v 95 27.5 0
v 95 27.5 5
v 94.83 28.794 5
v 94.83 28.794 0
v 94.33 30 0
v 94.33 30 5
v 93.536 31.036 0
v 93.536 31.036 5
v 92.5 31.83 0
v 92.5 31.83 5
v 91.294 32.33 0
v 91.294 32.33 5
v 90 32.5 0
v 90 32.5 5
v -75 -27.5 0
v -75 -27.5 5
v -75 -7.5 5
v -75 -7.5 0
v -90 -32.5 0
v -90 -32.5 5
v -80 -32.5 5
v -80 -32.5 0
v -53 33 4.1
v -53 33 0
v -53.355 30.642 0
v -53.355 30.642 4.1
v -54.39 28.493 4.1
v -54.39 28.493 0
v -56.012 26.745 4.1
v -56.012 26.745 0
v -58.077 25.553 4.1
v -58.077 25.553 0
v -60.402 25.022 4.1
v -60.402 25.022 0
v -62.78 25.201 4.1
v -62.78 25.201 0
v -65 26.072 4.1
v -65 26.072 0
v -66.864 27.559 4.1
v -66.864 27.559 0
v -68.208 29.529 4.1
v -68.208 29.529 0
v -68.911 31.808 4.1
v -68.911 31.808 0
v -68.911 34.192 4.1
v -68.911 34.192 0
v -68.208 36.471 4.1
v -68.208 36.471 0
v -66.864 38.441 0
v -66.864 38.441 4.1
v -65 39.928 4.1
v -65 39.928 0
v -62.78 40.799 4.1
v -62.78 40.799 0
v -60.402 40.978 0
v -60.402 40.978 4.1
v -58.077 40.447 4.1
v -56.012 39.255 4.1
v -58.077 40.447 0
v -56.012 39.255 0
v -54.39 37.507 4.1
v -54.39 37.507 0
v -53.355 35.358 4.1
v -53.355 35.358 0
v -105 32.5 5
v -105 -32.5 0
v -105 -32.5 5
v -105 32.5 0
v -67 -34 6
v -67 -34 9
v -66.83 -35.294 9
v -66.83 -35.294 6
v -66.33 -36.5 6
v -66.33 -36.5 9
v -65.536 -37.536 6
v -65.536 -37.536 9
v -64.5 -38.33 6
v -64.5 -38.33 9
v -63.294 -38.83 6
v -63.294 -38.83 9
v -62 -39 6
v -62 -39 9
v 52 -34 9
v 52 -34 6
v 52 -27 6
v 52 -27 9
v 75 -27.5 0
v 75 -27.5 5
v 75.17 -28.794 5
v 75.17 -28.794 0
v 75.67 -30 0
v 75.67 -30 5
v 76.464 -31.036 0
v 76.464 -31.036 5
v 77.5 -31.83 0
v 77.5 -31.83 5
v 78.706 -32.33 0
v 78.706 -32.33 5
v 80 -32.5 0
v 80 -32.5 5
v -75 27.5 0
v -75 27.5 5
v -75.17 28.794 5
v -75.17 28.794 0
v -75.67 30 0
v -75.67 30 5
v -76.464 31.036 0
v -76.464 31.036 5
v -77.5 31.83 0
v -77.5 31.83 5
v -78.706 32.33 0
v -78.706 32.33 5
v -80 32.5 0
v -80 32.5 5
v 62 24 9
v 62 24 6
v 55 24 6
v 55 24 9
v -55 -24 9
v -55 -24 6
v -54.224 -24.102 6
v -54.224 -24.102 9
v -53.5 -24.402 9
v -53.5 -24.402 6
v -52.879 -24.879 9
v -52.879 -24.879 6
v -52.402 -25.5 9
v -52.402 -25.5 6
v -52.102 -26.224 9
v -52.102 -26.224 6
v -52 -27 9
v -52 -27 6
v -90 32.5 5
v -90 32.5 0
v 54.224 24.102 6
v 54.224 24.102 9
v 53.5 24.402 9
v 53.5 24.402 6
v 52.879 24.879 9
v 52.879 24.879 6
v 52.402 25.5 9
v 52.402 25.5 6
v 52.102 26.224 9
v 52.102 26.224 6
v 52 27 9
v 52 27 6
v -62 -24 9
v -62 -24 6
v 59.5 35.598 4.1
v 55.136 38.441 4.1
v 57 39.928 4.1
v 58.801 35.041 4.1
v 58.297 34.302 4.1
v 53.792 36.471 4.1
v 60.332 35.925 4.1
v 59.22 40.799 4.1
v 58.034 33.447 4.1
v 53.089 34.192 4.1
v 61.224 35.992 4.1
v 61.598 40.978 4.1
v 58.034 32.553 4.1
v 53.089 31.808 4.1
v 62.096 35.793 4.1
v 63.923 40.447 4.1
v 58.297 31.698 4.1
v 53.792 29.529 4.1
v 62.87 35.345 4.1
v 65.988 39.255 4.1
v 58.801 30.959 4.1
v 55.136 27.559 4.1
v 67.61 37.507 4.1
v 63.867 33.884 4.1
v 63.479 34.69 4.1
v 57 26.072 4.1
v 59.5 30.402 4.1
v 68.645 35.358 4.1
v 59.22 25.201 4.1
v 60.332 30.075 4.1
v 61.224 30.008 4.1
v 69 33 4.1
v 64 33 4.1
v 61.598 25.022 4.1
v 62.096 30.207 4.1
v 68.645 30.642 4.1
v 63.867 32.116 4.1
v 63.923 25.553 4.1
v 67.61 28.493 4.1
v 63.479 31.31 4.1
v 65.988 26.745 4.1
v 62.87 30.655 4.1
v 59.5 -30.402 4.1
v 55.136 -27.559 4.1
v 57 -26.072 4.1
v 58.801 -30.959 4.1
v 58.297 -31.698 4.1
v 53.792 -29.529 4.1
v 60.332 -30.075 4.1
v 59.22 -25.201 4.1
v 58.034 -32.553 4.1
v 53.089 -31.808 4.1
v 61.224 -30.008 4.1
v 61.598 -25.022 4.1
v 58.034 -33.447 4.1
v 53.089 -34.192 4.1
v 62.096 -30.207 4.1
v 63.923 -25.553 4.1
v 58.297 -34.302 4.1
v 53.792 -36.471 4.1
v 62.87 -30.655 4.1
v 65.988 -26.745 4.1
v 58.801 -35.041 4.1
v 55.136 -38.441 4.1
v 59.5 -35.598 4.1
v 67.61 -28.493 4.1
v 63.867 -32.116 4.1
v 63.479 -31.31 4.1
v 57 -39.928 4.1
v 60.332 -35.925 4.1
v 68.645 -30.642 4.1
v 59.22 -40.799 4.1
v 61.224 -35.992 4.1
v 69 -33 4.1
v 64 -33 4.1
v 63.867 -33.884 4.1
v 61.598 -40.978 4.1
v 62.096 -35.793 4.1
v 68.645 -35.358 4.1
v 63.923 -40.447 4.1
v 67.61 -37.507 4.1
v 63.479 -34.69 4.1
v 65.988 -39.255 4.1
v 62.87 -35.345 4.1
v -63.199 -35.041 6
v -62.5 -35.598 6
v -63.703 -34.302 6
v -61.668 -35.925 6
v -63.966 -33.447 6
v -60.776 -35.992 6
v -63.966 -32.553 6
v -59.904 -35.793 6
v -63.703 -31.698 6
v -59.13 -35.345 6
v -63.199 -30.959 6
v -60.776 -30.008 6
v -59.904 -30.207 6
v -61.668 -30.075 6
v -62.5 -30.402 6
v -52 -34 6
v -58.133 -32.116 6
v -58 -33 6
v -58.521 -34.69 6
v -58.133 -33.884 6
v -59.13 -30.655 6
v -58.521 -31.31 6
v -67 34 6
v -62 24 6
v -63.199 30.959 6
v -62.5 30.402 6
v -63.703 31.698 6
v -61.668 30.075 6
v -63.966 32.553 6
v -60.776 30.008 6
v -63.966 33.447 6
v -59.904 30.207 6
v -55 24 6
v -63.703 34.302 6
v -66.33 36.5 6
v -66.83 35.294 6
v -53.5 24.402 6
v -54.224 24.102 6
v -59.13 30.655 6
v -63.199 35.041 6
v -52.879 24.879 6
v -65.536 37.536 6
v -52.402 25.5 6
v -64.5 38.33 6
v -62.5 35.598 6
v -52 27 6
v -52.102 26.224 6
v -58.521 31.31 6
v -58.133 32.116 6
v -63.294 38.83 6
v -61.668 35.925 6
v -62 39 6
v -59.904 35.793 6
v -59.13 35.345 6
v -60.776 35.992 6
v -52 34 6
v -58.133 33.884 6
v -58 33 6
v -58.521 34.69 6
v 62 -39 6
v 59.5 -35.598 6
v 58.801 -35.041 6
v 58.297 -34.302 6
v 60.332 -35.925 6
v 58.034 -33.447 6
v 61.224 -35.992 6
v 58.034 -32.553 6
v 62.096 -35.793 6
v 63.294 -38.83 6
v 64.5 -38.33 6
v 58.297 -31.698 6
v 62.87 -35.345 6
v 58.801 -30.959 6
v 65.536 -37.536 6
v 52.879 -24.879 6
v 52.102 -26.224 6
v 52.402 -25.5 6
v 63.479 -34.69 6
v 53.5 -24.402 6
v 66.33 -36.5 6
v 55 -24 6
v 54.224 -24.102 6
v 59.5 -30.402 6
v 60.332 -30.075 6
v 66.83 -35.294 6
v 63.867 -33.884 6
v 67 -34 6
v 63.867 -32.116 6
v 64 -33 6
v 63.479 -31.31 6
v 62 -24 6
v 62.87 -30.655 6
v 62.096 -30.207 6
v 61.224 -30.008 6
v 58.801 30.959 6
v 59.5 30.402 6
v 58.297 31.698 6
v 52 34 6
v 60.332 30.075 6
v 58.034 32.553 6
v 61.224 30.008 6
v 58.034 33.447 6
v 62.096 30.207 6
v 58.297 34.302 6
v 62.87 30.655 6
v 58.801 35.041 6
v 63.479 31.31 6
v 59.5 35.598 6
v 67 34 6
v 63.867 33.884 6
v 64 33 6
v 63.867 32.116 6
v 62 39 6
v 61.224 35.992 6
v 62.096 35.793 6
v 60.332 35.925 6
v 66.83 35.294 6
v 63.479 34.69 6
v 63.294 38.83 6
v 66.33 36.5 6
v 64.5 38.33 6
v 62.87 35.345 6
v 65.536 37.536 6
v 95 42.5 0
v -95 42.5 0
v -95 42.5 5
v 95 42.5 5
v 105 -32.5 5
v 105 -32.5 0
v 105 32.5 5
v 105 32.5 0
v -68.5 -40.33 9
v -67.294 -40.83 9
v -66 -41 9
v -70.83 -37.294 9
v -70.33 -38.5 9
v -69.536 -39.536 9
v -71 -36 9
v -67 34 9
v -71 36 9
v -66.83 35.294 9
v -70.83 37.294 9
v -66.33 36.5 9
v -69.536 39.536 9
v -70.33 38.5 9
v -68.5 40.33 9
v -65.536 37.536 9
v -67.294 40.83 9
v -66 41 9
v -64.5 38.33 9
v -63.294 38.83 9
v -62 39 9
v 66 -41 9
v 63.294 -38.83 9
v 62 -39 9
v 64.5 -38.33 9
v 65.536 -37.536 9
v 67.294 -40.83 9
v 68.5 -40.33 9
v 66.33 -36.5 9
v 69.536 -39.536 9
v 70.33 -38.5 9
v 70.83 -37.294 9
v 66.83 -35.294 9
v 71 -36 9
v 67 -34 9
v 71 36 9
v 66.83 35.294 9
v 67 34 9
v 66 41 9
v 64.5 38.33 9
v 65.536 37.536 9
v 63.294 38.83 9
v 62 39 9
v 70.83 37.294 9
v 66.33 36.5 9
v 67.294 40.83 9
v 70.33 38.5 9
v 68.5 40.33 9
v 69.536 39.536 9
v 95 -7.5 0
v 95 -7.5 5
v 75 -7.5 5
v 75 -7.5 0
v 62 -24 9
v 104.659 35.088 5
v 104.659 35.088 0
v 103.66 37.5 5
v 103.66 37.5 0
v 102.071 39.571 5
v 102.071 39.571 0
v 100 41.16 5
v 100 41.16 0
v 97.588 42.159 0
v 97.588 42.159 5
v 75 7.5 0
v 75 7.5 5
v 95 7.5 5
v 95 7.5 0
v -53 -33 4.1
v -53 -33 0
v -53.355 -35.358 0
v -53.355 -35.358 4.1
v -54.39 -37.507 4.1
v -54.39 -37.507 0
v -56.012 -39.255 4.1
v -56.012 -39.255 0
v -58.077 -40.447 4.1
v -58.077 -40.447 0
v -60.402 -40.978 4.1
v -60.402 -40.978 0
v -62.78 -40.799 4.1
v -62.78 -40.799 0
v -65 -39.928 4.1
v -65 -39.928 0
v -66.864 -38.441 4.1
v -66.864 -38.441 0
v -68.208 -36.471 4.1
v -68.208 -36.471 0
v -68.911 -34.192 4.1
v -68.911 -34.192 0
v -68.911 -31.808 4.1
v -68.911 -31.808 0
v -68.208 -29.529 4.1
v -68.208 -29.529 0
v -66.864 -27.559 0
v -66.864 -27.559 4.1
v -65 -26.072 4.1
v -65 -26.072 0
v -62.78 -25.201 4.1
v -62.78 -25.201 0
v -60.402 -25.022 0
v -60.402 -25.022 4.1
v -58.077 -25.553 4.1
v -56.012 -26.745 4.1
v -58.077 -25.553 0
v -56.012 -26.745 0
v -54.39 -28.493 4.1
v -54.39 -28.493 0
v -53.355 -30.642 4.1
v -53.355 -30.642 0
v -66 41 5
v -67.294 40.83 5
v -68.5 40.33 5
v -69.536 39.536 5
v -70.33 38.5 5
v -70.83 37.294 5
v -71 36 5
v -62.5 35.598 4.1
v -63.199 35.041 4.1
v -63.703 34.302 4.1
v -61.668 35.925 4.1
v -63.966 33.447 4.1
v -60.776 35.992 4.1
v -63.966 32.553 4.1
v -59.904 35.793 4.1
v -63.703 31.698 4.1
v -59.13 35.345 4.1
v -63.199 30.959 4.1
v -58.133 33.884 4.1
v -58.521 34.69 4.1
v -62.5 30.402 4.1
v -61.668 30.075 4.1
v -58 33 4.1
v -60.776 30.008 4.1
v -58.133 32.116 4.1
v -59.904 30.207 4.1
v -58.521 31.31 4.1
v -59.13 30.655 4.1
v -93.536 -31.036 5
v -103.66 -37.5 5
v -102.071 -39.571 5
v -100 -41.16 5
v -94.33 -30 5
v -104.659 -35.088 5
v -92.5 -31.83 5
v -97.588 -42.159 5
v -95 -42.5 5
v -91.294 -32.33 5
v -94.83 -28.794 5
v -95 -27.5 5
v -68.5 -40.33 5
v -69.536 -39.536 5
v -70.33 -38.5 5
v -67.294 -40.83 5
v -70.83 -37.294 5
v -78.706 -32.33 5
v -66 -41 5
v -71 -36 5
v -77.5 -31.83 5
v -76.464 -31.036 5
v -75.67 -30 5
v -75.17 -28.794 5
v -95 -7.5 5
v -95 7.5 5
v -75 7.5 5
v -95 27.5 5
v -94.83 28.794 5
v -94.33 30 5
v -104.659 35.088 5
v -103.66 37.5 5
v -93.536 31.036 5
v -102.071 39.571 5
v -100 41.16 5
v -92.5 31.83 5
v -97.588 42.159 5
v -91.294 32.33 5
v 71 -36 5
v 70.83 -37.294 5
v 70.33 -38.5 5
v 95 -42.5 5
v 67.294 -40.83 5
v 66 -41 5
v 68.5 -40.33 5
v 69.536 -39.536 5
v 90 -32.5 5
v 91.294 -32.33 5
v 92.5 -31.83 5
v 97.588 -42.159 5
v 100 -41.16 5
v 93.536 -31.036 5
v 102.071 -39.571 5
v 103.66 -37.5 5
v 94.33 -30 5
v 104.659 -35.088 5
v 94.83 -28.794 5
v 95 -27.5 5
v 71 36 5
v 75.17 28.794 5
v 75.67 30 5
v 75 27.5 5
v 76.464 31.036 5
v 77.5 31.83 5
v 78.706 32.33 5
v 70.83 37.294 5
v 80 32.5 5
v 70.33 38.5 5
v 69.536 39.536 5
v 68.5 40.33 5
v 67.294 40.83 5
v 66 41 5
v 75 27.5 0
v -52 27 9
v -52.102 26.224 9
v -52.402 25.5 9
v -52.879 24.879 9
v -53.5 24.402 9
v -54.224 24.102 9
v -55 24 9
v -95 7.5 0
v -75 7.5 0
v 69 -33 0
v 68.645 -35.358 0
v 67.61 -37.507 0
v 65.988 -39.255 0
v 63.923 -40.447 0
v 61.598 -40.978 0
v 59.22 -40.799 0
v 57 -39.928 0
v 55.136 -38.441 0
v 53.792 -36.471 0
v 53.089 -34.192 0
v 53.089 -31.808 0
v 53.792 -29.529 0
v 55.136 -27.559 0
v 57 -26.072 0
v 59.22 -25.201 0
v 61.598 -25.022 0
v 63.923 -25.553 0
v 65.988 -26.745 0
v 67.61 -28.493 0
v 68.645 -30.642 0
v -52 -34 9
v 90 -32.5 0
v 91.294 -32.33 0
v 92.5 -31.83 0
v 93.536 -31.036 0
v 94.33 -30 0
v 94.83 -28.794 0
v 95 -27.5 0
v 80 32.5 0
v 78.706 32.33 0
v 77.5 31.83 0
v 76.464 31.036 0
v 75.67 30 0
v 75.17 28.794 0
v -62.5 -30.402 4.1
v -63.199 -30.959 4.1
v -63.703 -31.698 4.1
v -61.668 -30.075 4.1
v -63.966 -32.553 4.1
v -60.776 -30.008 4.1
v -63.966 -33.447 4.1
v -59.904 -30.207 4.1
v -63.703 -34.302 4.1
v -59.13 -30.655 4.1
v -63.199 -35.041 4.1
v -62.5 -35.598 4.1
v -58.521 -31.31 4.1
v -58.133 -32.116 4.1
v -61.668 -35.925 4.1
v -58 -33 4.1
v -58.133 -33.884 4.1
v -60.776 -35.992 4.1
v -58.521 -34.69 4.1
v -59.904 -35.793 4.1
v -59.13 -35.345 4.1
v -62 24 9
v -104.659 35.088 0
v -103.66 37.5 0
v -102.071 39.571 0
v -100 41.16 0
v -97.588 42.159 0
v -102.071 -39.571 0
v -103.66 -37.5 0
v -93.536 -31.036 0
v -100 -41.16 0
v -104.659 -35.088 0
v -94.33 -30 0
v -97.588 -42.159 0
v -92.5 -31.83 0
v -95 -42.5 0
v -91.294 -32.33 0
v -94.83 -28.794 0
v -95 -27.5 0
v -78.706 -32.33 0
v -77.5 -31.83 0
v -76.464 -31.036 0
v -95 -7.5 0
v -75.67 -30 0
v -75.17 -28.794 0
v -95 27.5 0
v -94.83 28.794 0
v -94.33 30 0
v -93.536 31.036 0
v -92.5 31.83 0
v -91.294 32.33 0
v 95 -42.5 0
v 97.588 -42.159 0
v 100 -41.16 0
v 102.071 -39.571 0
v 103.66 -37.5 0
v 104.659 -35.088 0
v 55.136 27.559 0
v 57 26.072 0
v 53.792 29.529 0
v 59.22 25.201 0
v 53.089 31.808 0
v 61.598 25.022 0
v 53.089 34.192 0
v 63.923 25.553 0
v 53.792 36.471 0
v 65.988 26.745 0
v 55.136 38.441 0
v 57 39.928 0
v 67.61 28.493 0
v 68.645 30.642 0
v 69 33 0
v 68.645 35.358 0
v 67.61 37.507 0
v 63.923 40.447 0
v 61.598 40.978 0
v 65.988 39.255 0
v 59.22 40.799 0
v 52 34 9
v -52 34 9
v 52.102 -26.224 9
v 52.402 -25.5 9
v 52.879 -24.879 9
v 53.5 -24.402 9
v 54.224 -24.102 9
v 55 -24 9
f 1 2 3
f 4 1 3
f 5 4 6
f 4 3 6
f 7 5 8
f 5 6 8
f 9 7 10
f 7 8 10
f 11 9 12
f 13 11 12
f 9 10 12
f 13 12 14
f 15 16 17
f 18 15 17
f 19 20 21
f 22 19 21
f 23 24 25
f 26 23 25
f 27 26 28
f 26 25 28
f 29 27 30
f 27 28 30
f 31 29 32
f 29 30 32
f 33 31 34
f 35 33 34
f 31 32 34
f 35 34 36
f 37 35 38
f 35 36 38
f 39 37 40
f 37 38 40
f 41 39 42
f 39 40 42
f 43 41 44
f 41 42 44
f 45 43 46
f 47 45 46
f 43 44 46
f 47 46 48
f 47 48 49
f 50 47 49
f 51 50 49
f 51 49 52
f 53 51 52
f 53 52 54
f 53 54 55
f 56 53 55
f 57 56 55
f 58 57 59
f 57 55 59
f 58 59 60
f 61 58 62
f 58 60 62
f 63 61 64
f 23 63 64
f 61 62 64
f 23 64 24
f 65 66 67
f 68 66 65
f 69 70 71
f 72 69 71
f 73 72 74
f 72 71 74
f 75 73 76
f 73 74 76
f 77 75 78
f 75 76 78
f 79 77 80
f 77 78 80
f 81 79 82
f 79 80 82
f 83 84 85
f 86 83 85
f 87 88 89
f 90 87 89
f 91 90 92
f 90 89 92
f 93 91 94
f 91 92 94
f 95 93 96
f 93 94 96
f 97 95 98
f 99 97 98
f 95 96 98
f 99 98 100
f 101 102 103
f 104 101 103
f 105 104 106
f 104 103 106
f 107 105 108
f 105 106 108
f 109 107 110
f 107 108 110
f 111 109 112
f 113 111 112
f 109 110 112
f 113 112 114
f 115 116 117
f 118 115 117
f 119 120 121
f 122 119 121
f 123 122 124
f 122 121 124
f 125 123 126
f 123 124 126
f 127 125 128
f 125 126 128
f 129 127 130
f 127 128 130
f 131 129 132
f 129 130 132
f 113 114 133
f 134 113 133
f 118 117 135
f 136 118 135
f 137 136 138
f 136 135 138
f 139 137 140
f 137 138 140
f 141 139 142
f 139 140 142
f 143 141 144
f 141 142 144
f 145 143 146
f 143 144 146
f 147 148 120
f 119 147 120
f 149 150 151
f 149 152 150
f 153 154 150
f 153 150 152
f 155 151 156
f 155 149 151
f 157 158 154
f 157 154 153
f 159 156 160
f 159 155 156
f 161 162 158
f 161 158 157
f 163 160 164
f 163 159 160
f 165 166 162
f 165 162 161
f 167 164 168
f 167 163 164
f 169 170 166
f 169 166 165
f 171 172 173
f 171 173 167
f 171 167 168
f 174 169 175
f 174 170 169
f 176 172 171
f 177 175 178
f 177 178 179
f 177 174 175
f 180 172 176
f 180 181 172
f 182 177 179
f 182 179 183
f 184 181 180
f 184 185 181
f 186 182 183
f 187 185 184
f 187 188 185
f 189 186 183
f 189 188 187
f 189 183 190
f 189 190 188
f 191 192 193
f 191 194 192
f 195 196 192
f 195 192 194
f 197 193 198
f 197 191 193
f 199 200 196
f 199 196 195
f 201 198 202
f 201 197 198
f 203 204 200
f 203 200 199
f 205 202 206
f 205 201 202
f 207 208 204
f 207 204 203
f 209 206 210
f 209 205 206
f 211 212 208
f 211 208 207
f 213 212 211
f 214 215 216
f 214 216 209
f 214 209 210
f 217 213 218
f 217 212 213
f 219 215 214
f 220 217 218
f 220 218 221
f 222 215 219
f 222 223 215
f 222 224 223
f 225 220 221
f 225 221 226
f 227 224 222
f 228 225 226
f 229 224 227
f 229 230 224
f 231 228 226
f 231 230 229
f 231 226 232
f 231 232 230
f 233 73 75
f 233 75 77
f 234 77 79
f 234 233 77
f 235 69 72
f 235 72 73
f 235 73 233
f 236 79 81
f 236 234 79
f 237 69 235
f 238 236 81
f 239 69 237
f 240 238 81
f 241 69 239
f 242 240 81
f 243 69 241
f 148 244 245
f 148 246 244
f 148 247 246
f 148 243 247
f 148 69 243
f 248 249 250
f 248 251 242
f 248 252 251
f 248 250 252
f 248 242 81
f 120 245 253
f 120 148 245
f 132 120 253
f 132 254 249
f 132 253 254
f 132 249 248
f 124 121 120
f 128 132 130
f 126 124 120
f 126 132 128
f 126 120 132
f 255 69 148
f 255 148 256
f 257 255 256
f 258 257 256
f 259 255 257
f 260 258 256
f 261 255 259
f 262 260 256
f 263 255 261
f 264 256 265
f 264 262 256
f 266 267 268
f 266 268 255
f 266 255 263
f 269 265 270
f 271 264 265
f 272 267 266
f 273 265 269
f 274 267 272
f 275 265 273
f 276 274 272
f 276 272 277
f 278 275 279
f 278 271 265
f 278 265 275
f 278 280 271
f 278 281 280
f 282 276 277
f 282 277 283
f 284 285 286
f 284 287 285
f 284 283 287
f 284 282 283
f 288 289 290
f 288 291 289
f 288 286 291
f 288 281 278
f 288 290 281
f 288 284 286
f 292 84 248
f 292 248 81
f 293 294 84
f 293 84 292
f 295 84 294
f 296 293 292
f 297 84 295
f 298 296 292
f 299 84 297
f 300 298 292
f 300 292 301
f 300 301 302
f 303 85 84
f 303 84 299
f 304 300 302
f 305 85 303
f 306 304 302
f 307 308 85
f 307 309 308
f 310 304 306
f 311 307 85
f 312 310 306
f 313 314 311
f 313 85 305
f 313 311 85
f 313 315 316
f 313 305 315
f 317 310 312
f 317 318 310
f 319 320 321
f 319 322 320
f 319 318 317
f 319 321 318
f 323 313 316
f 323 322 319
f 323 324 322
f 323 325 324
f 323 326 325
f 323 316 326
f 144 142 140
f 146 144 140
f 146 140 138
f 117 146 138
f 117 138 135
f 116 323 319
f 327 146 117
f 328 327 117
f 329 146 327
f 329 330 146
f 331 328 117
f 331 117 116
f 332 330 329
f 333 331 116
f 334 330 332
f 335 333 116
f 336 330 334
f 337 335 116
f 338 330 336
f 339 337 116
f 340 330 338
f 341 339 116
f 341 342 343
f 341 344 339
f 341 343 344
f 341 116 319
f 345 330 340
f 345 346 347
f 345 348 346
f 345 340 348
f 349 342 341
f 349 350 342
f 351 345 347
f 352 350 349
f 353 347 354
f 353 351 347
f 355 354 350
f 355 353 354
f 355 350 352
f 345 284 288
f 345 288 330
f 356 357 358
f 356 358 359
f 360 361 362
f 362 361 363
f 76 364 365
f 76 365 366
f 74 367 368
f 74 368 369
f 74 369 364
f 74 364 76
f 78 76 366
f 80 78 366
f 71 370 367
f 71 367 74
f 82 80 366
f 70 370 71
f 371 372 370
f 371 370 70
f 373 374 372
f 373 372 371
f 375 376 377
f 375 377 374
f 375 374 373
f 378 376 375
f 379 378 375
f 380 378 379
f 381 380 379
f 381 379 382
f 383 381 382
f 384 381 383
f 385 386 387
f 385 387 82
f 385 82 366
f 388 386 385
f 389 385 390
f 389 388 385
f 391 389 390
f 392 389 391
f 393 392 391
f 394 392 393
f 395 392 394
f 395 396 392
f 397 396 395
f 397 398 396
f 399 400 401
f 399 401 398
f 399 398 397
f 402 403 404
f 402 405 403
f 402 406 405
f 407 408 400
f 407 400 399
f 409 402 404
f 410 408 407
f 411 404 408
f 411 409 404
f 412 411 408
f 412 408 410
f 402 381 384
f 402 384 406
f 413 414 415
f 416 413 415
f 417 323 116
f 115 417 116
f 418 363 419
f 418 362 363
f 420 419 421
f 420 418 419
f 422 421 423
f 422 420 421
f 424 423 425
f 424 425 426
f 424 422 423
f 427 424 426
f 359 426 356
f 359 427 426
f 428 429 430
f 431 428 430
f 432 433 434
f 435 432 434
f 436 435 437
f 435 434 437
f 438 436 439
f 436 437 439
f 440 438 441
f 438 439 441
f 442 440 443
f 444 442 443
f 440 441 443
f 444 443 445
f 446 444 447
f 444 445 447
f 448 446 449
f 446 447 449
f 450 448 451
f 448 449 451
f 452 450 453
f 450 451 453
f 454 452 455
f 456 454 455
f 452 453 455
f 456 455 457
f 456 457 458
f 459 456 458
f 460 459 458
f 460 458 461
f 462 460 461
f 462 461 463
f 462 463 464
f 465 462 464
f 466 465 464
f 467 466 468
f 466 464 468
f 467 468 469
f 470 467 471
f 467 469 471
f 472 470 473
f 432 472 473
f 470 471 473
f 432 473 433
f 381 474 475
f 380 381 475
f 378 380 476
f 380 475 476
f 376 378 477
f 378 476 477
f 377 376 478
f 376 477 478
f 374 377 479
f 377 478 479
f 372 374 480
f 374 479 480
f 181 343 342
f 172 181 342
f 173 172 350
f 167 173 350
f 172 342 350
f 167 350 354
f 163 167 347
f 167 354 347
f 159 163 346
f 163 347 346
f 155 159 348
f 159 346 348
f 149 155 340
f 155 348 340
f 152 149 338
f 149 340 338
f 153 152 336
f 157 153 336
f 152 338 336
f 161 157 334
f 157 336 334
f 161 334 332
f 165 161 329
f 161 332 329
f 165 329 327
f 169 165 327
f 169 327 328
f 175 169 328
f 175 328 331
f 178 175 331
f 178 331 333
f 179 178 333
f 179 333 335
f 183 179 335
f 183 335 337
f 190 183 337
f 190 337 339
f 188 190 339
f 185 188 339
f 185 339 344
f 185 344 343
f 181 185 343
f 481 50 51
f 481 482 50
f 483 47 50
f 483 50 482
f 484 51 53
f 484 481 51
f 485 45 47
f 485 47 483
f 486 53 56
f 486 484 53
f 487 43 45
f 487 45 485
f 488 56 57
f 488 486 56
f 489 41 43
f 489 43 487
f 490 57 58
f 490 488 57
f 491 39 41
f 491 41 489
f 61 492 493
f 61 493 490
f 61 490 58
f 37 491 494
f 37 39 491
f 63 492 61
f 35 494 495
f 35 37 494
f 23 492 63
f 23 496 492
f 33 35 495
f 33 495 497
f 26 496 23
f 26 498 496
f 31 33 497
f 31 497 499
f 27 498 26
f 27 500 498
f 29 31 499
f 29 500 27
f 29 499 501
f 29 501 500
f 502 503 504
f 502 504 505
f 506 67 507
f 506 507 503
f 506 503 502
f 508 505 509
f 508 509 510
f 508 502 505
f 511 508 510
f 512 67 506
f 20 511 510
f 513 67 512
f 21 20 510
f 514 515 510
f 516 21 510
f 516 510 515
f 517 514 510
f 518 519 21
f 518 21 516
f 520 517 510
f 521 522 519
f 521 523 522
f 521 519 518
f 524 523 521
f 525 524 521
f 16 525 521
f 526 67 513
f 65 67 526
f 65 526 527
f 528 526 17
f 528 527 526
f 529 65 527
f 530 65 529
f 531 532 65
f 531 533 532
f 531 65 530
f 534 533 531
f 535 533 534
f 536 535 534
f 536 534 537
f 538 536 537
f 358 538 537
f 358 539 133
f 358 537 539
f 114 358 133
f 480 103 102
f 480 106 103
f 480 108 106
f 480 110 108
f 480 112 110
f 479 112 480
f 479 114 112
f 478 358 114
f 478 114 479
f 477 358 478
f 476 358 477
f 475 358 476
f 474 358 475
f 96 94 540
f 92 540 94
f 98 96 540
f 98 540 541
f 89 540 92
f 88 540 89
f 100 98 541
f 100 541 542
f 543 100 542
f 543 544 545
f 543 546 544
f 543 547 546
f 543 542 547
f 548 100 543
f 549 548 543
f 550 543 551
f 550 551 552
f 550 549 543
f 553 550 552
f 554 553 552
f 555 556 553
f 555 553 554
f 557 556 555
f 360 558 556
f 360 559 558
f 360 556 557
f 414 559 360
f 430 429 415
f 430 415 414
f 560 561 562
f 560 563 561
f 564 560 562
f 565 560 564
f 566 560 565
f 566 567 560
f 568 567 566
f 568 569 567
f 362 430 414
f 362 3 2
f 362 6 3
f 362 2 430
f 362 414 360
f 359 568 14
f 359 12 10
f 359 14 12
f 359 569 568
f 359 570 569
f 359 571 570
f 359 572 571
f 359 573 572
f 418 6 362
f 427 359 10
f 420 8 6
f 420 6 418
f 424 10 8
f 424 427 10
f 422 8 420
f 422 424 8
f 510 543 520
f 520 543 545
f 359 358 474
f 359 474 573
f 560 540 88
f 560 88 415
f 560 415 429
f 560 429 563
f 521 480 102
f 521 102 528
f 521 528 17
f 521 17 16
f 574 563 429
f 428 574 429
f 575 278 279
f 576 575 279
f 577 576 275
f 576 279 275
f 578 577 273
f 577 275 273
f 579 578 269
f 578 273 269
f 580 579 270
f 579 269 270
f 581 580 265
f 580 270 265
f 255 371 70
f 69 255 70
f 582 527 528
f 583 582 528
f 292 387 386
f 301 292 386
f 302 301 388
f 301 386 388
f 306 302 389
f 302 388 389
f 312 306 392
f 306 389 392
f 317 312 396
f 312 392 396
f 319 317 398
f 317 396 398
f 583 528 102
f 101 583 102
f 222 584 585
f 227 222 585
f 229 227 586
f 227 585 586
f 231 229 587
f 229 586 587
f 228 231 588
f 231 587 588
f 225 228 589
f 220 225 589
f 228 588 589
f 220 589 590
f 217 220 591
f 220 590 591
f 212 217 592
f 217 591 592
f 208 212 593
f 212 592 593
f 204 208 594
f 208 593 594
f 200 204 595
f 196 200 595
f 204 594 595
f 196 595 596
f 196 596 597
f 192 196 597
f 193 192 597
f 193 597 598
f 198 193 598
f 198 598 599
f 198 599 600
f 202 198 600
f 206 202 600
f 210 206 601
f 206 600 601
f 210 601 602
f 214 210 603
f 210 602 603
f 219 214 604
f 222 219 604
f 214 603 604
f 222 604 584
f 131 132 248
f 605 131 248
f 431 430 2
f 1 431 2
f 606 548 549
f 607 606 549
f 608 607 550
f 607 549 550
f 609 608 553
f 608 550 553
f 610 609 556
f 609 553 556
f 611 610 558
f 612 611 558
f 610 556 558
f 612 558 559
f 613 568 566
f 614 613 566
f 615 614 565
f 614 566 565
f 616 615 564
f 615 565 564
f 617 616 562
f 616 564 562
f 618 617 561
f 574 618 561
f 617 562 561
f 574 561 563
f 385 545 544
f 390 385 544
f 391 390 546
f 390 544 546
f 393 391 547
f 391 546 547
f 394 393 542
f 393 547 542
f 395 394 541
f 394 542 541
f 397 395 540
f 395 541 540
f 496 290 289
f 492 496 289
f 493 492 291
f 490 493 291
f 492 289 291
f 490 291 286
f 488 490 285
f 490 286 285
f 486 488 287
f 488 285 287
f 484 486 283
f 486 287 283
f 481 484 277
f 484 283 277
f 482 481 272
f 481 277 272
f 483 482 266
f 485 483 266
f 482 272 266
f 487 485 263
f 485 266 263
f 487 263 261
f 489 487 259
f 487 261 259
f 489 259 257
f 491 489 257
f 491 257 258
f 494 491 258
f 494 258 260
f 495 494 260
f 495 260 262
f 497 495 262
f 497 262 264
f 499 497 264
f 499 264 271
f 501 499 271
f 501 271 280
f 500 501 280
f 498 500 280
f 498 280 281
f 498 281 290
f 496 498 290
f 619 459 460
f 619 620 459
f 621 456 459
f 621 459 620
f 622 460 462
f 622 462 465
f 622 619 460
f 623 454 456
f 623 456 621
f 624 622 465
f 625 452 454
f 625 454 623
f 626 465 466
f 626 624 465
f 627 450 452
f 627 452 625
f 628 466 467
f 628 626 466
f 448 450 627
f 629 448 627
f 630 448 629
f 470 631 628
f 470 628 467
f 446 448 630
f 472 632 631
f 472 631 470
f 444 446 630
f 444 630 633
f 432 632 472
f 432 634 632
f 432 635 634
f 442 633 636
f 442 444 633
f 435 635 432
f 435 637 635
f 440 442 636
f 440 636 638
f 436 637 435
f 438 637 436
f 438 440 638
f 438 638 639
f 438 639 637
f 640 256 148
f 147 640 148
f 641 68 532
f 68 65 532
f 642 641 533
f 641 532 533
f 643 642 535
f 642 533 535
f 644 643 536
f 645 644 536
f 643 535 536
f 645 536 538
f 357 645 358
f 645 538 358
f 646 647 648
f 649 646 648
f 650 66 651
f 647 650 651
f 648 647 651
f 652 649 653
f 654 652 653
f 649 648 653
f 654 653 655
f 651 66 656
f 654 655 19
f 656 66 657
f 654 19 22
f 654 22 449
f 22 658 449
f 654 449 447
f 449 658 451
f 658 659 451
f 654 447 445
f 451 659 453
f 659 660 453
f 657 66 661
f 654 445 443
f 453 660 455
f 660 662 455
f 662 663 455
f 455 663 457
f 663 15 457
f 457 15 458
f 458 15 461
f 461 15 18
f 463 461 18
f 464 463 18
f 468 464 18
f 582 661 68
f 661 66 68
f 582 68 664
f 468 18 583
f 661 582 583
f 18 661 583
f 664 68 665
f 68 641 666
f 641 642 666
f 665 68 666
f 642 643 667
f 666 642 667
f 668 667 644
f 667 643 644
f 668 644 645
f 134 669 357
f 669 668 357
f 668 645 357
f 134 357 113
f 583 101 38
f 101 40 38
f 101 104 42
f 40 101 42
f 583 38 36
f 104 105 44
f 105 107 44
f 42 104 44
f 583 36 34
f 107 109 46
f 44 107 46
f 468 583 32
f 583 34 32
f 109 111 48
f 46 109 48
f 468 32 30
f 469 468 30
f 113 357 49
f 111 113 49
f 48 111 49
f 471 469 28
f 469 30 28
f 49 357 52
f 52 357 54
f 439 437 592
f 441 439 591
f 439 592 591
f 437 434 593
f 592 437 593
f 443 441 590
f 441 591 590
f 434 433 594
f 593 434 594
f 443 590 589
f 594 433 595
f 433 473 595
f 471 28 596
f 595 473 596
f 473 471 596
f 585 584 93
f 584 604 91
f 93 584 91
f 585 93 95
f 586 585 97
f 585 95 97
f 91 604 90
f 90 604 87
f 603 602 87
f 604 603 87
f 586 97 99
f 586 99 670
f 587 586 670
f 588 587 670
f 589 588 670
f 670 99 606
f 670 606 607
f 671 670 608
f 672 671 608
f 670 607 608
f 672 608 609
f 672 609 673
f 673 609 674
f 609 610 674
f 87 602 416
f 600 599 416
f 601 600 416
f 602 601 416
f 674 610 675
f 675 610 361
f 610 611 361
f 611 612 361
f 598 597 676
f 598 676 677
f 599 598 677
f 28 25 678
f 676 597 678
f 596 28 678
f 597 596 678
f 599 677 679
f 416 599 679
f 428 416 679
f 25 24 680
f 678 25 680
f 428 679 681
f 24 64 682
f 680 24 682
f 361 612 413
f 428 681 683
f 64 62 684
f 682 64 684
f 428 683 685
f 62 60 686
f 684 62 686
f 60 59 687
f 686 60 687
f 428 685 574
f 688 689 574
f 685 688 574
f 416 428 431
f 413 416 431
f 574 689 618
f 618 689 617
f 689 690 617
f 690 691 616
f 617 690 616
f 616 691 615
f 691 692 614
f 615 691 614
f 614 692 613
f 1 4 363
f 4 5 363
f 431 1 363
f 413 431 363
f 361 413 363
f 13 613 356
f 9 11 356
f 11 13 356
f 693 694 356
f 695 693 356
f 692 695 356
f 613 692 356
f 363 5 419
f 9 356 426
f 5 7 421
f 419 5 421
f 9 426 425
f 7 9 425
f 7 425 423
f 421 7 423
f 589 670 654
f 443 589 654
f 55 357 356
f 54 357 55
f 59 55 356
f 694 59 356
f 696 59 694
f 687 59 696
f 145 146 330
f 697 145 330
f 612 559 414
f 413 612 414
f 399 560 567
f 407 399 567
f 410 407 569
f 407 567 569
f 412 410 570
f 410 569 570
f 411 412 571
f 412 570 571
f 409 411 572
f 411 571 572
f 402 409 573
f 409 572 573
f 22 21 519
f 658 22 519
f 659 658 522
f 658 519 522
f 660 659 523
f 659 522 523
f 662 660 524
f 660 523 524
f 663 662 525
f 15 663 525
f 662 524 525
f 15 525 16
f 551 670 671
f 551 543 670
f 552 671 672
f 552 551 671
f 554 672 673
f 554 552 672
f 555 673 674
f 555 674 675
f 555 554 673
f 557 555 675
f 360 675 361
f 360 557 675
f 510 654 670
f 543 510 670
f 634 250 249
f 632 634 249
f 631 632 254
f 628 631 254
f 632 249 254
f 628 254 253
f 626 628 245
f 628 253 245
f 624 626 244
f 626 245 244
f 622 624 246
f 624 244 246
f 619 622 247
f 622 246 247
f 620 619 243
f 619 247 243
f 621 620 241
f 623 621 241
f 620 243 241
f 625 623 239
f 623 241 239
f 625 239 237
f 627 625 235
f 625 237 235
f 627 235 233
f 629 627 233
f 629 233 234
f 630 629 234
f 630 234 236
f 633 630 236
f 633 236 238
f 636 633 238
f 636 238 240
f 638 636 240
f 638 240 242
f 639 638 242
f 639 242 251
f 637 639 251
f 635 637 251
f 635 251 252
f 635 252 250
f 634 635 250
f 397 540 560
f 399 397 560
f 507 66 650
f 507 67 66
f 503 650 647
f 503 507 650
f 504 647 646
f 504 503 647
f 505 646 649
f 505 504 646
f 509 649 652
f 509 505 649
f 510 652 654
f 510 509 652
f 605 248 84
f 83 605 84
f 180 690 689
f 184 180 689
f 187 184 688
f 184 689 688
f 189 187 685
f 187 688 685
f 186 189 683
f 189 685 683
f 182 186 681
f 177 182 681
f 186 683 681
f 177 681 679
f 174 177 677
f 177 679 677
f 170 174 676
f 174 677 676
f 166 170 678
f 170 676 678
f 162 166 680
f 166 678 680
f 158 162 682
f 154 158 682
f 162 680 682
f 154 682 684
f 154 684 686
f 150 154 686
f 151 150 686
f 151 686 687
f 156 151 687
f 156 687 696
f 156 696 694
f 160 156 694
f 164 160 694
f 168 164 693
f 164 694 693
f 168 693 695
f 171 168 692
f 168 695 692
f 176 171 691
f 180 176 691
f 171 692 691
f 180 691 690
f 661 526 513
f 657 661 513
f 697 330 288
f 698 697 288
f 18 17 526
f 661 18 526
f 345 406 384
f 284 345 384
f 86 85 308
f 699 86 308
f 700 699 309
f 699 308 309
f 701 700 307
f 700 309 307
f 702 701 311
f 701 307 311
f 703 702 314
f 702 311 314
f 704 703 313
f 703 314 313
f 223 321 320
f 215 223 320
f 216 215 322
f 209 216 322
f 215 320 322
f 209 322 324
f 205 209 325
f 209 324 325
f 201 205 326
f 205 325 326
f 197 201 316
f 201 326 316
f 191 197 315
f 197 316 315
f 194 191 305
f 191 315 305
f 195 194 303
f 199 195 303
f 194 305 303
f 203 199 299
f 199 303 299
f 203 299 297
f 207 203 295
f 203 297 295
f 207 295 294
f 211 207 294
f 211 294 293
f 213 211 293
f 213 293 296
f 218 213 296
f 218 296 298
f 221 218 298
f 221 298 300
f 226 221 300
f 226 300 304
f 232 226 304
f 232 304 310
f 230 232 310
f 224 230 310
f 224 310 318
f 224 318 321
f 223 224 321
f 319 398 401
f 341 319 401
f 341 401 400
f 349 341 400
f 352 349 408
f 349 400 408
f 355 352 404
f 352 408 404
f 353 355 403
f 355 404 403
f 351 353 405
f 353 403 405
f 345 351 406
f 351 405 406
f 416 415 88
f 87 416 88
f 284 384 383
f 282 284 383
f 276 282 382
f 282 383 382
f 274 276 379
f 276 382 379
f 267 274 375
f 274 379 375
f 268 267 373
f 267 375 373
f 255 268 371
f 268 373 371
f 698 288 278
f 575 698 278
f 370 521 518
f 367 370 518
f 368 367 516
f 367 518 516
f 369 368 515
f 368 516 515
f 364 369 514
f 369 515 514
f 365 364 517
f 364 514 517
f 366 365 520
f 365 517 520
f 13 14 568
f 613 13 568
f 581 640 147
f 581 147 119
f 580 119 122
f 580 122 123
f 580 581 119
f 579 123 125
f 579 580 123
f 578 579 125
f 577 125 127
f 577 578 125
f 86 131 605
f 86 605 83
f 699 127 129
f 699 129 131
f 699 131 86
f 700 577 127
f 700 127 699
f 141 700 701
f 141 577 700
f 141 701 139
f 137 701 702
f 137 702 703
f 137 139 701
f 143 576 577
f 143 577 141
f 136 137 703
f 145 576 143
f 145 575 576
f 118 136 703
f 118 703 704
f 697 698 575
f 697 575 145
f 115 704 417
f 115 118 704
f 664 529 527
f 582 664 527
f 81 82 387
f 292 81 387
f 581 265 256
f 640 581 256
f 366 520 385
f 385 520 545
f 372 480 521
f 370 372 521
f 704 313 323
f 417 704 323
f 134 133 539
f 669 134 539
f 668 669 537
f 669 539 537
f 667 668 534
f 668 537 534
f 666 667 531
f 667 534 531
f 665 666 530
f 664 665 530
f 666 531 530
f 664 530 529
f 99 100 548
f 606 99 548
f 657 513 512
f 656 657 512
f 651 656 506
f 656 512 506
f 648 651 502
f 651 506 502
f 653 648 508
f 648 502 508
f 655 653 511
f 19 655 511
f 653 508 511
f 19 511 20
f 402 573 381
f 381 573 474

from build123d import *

# Parameters (mm, degrees)
F0_W      = 210
F0_H      = 85
F1_DEPTH  = 5
F2_R      = 10
F4_DEPTH  = 4
F6_DEPTH  = 3
F8_DEPTH  = 3
F9_R      = 3
F10_DEPTH = 25
F11_R     = 8
F12_DEPTH = 4.1
F14_DEPTH = 25


with BuildPart() as f1:
    # F0 (on Top) → F1 (new body)
    with BuildSketch(Plane.XY):
        Rectangle(F0_W, F0_H)
    extrude(amount=F1_DEPTH)

    # F2
    f2_edges = [f1.edges().sort_by_distance(p)[0] for p in [
        (-105, -42.5, 2.5),
        (-105, 42.5, 2.5),
        (105, 42.5, 2.5),
        (105, -42.5, 2.5),
    ]]
    fillet(f2_edges, radius=F2_R)

    # F3 (on face) → F4 (join)
    with BuildSketch(Plane.XY.offset(5)):
        with BuildLine():
            Line((66, 41), (-66, 41))
            ThreePointArc((-66, 41), (-69.535534, 39.535534), (-71, 36))
            Line((-71, 36), (-71, -36))
            ThreePointArc((-71, -36), (-69.535534, -39.535534), (-66, -41))
            Line((-66, -41), (66, -41))
            ThreePointArc((66, -41), (69.535534, -39.535534), (71, -36))
            Line((71, -36), (71, 36))
            ThreePointArc((71, 36), (69.535534, 39.535534), (66, 41))
        make_face()
    extrude(amount=F4_DEPTH)

    # F5 (on face) → F6 (cut)
    with BuildSketch(Plane.XY.offset(9)):
        with BuildLine():
            Line((62, 39), (-62, 39))
            ThreePointArc((-62, 39), (-65.535534, 37.535534), (-67, 34))
            Line((-67, 34), (-67, -34))
            ThreePointArc((-67, -34), (-65.535534, -37.535534), (-62, -39))
            Line((-62, -39), (62, -39))
            ThreePointArc((62, -39), (65.535534, -37.535534), (67, -34))
            Line((67, -34), (67, 34))
            ThreePointArc((67, 34), (65.535534, 37.535534), (62, 39))
        make_face()
    extrude(amount=-F6_DEPTH, mode=Mode.SUBTRACT)

    # F7 (on face) → F8 (join)
    with BuildSketch(Plane.XY.offset(6)):
        with BuildLine():
            Line((52, 34), (-52, 34))
            Line((-52, 34), (-52, 27))
            ThreePointArc((-52, 27), (-52.87868, 24.87868), (-55, 24))
            Line((-55, 24), (-62, 24))
            Line((-62, 24), (-62, -24))
            Line((-62, -24), (-55, -24))
            ThreePointArc((-55, -24), (-52.87868, -24.87868), (-52, -27))
            Line((-52, -27), (-52, -34))
            Line((-52, -34), (52, -34))
            Line((52, -34), (52, -27))
            ThreePointArc((52, -27), (52.87868, -24.87868), (55, -24))
            Line((55, -24), (62, -24))
            Line((62, -24), (62, 24))
            Line((62, 24), (55, 24))
            ThreePointArc((55, 24), (52.87868, 24.87868), (52, 27))
            Line((52, 27), (52, 34))
        make_face()
    extrude(amount=F8_DEPTH)

    # F9 (on face) → F10 (cut)
    with BuildSketch(Plane.XY.offset(6)):
        with Locations((-61, -33)):
            Circle(F9_R)
        with Locations((-61, 33)):
            Circle(F9_R)
        with Locations((61, -33)):
            Circle(F9_R)
        with Locations((61, 33)):
            Circle(F9_R)
    extrude(amount=-F10_DEPTH, mode=Mode.SUBTRACT)

    # F11 (on face) → F12 (cut)
    with BuildSketch(Plane(origin=(0, 0, 0), x_dir=(1, 0, 0), z_dir=(0, 0, -1))):
        with Locations((-61, 33)):
            Circle(F11_R)
        with Locations((-61, -33)):
            Circle(F11_R)
        with Locations((61, -33)):
            Circle(F11_R)
        with Locations((61, 33)):
            Circle(F11_R)
    extrude(amount=-F12_DEPTH, mode=Mode.SUBTRACT)

    # F13 (on face) → F14 (cut)
    with BuildSketch(Plane.XY.offset(5)):
        with BuildLine():
            Line((-80, 32.5), (-90, 32.5))
            ThreePointArc((-90, 32.5), (-93.535534, 31.035534), (-95, 27.5))
            Line((-95, 27.5), (-95, 7.5))
            Line((-95, 7.5), (-75, 7.5))
            Line((-75, 7.5), (-75, 27.5))
            ThreePointArc((-75, 27.5), (-76.464466, 31.035534), (-80, 32.5))
        make_face()
        with BuildLine():
            ThreePointArc((-80, -32.5), (-76.464466, -31.035534), (-75, -27.5))
            Line((-75, -27.5), (-75, -7.5))
            Line((-75, -7.5), (-95, -7.5))
            Line((-95, -7.5), (-95, -27.5))
            ThreePointArc((-95, -27.5), (-93.535534, -31.035534), (-90, -32.5))
            Line((-90, -32.5), (-80, -32.5))
        make_face()
        with BuildLine():
            ThreePointArc((80, 32.5), (76.464466, 31.035534), (75, 27.5))
            Line((75, 27.5), (75, 7.5))
            Line((75, 7.5), (95, 7.5))
            Line((95, 7.5), (95, 27.5))
            ThreePointArc((95, 27.5), (93.535534, 31.035534), (90, 32.5))
            Line((90, 32.5), (80, 32.5))
        make_face()
        with BuildLine():
            Line((75, -7.5), (75, -27.5))
            ThreePointArc((75, -27.5), (76.464466, -31.035534), (80, -32.5))
            Line((80, -32.5), (90, -32.5))
            ThreePointArc((90, -32.5), (93.535534, -31.035534), (95, -27.5))
            Line((95, -27.5), (95, -7.5))
            Line((95, -7.5), (75, -7.5))
        make_face()
    extrude(amount=-F14_DEPTH, mode=Mode.SUBTRACT)


solid = f1.part
